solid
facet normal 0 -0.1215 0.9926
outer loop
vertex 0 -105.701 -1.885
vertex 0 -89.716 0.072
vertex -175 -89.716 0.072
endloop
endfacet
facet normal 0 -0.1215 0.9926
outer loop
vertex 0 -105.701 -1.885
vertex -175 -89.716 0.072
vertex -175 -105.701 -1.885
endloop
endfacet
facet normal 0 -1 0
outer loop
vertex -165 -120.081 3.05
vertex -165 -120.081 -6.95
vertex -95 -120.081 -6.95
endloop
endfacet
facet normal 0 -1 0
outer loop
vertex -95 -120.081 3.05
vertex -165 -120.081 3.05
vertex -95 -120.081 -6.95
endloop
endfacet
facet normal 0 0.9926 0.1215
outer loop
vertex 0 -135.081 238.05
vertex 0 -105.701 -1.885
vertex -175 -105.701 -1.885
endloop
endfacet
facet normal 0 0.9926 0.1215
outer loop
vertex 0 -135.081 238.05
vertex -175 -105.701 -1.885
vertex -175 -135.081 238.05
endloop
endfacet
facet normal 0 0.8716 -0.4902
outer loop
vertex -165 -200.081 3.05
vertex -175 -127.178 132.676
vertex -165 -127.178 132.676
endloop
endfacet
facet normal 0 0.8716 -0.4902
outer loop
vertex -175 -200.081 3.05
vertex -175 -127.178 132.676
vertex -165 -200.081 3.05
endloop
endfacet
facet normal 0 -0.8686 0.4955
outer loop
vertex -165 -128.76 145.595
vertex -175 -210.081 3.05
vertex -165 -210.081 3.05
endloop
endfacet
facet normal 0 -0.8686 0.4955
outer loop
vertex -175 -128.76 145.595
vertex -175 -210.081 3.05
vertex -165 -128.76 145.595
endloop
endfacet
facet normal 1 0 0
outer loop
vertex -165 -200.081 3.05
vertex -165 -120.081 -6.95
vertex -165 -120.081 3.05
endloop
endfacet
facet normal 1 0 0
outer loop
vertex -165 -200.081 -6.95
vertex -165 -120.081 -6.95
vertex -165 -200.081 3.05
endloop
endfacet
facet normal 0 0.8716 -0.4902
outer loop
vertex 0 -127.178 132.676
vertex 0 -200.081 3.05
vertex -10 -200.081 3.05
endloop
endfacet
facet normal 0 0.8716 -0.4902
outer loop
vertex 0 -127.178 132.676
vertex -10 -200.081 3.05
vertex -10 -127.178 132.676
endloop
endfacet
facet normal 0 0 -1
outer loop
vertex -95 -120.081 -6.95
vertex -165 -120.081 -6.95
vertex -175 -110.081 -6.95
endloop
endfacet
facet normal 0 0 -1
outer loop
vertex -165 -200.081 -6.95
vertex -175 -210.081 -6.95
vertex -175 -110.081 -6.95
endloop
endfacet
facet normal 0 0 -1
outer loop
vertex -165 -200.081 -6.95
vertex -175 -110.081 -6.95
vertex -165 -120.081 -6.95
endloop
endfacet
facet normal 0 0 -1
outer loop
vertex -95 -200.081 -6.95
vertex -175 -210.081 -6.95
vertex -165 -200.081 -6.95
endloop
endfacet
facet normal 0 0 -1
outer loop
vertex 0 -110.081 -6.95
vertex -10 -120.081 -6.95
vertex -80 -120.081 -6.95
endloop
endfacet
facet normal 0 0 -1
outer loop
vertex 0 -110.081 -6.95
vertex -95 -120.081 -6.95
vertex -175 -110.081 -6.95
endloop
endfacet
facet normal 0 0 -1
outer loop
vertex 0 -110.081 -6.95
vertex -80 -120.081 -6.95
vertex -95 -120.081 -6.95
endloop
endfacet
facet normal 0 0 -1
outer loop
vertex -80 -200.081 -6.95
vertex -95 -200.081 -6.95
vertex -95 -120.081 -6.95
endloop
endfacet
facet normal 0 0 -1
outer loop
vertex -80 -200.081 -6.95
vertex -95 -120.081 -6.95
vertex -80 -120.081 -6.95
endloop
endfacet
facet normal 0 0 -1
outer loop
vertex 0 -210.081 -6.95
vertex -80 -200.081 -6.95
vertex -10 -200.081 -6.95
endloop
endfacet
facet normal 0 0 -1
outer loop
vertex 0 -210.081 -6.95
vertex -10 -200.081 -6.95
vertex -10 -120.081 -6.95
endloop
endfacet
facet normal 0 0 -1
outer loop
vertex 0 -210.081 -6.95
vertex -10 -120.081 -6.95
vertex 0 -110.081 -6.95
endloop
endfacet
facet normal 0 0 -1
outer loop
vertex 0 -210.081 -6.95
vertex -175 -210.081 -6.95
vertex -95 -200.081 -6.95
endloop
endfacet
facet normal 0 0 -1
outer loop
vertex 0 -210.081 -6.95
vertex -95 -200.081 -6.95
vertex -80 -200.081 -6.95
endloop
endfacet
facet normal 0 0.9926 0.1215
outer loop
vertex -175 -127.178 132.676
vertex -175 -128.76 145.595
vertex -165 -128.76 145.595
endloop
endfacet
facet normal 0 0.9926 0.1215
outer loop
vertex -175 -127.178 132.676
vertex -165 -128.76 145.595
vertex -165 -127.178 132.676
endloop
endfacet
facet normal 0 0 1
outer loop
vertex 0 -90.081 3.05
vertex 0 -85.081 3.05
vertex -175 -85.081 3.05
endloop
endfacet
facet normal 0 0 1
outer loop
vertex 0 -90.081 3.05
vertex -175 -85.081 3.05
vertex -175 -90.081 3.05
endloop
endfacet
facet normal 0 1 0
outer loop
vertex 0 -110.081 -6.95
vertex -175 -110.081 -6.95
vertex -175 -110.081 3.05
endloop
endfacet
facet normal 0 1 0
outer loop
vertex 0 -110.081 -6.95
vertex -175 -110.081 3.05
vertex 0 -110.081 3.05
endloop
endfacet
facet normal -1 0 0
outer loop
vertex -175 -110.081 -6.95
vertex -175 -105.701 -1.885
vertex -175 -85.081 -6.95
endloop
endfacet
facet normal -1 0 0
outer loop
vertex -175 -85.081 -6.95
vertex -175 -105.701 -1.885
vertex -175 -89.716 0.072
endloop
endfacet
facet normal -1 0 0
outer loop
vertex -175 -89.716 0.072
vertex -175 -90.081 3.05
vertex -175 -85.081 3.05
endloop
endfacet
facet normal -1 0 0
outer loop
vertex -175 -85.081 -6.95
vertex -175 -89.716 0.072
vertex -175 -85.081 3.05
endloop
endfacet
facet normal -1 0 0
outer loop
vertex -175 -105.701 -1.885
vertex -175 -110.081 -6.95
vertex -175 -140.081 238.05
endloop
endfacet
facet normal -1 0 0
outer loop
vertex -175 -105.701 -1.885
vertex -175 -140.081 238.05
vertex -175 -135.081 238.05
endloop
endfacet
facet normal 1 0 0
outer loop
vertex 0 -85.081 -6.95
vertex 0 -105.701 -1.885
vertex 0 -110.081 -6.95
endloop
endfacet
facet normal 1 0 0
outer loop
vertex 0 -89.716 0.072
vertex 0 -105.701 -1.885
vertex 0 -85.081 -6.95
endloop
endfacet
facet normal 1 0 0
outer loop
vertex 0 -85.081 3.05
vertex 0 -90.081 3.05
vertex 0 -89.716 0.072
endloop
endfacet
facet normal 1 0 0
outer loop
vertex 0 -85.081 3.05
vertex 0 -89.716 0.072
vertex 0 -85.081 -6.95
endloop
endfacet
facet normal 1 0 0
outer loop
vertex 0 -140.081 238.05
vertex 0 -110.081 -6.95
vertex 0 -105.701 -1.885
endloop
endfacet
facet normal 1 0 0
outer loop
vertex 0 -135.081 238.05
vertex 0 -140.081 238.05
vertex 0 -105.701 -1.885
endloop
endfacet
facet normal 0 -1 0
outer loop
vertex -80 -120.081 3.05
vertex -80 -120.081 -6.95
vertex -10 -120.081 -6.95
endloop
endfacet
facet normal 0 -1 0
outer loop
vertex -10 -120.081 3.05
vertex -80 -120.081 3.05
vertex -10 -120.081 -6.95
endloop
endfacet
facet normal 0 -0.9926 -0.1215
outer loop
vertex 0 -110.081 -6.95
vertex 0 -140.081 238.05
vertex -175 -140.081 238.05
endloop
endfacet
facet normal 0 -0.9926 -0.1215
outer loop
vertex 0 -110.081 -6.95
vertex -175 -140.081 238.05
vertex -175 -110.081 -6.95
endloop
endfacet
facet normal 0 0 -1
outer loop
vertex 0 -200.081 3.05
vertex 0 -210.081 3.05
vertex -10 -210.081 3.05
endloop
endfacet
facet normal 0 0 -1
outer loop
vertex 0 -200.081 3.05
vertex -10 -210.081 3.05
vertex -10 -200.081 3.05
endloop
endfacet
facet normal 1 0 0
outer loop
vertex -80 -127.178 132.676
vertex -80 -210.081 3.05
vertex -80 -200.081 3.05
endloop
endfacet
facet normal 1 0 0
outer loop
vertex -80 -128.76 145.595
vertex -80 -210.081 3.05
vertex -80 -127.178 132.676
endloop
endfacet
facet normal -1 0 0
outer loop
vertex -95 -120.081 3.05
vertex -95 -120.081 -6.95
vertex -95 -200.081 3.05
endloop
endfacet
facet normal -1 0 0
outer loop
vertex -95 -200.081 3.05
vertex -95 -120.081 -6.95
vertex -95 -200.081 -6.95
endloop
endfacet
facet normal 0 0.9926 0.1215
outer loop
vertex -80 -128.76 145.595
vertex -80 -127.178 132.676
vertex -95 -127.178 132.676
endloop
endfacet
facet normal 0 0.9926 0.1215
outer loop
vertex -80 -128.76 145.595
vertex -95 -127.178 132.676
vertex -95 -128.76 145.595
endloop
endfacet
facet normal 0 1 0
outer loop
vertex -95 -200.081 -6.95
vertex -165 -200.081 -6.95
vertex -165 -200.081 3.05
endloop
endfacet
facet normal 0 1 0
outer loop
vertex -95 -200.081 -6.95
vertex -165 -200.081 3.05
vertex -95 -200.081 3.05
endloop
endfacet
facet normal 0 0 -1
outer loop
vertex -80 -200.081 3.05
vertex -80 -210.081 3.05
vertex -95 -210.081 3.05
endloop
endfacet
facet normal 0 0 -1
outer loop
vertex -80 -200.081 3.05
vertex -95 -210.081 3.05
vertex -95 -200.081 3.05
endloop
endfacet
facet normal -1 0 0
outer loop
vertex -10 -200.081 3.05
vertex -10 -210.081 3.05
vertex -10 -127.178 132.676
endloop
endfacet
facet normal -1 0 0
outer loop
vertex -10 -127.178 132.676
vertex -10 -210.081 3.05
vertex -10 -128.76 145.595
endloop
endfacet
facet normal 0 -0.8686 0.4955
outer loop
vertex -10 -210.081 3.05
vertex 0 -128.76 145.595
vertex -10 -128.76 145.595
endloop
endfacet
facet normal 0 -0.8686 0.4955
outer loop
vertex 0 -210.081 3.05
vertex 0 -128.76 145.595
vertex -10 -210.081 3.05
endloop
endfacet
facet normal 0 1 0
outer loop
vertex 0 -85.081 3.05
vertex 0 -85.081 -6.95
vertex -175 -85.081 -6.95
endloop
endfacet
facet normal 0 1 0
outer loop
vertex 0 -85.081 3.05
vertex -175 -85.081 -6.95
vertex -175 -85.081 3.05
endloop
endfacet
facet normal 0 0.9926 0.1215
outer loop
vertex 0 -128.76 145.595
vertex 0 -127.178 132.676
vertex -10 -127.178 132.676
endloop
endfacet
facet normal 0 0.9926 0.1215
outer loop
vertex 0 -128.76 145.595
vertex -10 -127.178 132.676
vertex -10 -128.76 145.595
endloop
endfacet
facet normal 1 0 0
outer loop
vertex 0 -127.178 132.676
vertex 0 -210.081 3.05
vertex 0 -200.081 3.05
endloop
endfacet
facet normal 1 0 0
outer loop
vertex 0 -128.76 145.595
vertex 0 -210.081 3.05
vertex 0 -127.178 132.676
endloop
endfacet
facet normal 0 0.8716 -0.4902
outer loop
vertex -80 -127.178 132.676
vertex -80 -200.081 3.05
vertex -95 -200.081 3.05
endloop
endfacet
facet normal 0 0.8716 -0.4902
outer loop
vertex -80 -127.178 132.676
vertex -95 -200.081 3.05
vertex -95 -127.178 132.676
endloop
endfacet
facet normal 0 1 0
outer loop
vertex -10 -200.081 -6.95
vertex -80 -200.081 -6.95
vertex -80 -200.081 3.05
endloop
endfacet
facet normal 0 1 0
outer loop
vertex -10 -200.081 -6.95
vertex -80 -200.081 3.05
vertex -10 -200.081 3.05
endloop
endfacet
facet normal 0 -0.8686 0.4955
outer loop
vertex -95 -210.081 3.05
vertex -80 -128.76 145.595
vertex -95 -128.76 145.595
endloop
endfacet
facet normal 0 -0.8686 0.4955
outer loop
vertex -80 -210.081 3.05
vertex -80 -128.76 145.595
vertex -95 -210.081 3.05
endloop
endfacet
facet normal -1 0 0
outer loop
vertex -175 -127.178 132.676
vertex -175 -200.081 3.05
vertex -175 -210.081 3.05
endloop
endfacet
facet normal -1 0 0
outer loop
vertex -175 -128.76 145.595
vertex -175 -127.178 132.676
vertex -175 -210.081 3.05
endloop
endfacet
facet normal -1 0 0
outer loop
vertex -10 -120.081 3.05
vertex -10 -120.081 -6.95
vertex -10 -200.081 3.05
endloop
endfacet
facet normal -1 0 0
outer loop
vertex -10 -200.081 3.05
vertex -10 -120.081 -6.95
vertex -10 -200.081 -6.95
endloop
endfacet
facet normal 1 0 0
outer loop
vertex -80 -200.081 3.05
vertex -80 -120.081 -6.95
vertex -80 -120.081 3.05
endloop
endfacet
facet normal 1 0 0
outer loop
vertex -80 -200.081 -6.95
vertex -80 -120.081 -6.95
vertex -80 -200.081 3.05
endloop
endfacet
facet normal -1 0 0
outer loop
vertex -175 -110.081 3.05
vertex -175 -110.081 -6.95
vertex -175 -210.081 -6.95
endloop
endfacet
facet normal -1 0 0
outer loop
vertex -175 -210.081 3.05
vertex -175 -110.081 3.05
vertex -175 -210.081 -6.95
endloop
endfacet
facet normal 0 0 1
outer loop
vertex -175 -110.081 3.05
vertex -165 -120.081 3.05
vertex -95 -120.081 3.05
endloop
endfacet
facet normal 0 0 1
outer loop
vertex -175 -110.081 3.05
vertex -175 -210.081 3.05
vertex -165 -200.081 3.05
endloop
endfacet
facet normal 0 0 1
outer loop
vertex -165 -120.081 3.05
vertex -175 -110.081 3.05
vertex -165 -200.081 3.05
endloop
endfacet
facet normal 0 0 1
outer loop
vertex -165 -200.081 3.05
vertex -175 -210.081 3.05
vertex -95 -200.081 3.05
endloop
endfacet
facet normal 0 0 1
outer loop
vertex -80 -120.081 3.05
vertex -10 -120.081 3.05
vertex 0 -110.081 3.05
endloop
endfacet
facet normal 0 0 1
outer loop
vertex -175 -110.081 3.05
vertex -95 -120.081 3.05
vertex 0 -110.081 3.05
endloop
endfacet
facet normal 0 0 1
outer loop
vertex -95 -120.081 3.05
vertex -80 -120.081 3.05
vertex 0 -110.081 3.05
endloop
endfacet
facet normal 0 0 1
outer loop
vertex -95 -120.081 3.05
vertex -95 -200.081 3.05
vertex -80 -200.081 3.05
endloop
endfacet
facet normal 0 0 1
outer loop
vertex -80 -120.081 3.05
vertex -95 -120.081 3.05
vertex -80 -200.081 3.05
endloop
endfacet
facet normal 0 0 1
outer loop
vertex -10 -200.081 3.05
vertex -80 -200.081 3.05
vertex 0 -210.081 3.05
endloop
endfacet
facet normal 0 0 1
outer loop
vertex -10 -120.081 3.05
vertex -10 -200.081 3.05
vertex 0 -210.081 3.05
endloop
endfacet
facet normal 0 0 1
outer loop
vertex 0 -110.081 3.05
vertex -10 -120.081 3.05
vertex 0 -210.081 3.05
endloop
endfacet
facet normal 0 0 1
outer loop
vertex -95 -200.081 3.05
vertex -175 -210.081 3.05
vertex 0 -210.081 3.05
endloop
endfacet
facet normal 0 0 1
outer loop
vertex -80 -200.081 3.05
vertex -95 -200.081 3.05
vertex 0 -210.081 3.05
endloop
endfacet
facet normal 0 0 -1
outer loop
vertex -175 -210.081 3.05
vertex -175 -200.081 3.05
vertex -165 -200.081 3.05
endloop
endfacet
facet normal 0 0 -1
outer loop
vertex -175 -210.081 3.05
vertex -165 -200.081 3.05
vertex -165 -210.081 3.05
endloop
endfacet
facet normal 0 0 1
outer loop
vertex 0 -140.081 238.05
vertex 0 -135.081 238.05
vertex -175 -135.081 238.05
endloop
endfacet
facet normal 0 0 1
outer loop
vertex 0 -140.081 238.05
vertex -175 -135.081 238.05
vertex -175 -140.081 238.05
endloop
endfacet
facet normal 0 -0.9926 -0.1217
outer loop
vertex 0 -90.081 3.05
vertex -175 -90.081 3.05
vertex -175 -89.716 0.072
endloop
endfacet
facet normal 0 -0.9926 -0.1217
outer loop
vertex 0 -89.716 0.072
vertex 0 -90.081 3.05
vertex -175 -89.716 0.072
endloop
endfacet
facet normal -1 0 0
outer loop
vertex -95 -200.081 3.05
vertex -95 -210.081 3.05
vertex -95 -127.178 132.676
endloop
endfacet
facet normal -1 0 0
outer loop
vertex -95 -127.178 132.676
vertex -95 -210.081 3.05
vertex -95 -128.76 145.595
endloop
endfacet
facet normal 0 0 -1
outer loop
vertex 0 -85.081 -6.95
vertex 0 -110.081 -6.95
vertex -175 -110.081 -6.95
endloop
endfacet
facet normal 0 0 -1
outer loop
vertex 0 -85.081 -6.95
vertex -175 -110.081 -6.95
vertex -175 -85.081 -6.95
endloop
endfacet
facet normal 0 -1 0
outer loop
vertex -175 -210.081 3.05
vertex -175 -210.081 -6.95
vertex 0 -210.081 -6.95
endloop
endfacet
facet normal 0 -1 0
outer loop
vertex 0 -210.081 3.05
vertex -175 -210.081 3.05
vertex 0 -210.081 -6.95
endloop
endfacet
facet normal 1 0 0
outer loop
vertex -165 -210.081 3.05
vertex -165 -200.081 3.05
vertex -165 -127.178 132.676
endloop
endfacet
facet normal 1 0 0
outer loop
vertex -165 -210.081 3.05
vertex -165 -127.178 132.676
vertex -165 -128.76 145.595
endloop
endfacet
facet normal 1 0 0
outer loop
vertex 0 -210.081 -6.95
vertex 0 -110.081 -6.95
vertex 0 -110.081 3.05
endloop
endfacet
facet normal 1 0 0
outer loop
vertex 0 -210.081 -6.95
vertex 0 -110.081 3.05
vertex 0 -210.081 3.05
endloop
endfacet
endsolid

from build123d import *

# Parameters (mm, degrees)
F1_DEPTH = 175
F2_W     = 175
F2_H     = 100
F2_W_2   = 70
F2_H_2   = 80
F3_DEPTH = 10
F5_DEPTH = 10
F7_DEPTH = 10
F9_DEPTH = 15


with BuildPart() as f1:
    # F0 (on Right) → F1 (new body)
    with BuildSketch(Plane.YZ):
        Polygon((-140.0806444883, 238.0496698797), (-110.0806444883, -6.9503301203), (-85.0806444883, -6.9503301203), (-85.0806444883, 3.0496698797), (-90.0806444883, 3.0496698797), (-89.716020917, 0.0719107136), (-105.7008383154, -1.8854138658), (-135.0806444883, 238.0496698797), align=None)
    extrude(amount=-F1_DEPTH)


with BuildPart() as f3:
    # F2 (on face) → F3 (new body)
    with BuildSketch(Plane(origin=(0, 0, -6.9503301203), x_dir=(1, 0, 0), z_dir=(0, 0, -1))):
        with Locations((-87.5, 160.0806444883)):
            Rectangle(F2_W, F2_H)
        with Locations((-130, 160.0806444883)):
            Rectangle(F2_W_2, F2_H_2, mode=Mode.SUBTRACT)
        with Locations((-45, 160.0806444883)):
            Rectangle(F2_W_2, F2_H_2, mode=Mode.SUBTRACT)
    extrude(amount=-F3_DEPTH)


with BuildPart() as f5:
    # F4 (on face) → F5 (new body)
    with BuildSketch(Plane(origin=(-175, 0, 0), x_dir=(0, -1, 0), z_dir=(-1, 0, 0))):
        Polygon((210.0806444883, 3.0496698797), (128.7596900546, 145.5952086706), (127.177746364, 132.676001864), (200.0806444883, 3.0496698797), align=None)
    extrude(amount=-F5_DEPTH)


with BuildPart() as f7:
    # F6 (on face) → F7 (new body)
    with BuildSketch(Plane.YZ):
        Polygon((-200.0806444883, 3.0496698797), (-127.177746364, 132.676001864), (-128.7596900546, 145.5952086706), (-210.0806444883, 3.0496698797), align=None)
    extrude(amount=-F7_DEPTH)


with BuildPart() as f9:
    # F8 (on face) → F9 (new body, through all)
    with BuildSketch(Plane.YZ.offset(-80)):
        Polygon((-200.0806444883, 3.0496698797), (-127.177746364, 132.676001864), (-128.7596900546, 145.5952086706), (-210.0806444883, 3.0496698797), align=None)
    extrude(amount=-F9_DEPTH)


solid = Compound([f1.part, f3.part, f5.part, f7.part, f9.part])
